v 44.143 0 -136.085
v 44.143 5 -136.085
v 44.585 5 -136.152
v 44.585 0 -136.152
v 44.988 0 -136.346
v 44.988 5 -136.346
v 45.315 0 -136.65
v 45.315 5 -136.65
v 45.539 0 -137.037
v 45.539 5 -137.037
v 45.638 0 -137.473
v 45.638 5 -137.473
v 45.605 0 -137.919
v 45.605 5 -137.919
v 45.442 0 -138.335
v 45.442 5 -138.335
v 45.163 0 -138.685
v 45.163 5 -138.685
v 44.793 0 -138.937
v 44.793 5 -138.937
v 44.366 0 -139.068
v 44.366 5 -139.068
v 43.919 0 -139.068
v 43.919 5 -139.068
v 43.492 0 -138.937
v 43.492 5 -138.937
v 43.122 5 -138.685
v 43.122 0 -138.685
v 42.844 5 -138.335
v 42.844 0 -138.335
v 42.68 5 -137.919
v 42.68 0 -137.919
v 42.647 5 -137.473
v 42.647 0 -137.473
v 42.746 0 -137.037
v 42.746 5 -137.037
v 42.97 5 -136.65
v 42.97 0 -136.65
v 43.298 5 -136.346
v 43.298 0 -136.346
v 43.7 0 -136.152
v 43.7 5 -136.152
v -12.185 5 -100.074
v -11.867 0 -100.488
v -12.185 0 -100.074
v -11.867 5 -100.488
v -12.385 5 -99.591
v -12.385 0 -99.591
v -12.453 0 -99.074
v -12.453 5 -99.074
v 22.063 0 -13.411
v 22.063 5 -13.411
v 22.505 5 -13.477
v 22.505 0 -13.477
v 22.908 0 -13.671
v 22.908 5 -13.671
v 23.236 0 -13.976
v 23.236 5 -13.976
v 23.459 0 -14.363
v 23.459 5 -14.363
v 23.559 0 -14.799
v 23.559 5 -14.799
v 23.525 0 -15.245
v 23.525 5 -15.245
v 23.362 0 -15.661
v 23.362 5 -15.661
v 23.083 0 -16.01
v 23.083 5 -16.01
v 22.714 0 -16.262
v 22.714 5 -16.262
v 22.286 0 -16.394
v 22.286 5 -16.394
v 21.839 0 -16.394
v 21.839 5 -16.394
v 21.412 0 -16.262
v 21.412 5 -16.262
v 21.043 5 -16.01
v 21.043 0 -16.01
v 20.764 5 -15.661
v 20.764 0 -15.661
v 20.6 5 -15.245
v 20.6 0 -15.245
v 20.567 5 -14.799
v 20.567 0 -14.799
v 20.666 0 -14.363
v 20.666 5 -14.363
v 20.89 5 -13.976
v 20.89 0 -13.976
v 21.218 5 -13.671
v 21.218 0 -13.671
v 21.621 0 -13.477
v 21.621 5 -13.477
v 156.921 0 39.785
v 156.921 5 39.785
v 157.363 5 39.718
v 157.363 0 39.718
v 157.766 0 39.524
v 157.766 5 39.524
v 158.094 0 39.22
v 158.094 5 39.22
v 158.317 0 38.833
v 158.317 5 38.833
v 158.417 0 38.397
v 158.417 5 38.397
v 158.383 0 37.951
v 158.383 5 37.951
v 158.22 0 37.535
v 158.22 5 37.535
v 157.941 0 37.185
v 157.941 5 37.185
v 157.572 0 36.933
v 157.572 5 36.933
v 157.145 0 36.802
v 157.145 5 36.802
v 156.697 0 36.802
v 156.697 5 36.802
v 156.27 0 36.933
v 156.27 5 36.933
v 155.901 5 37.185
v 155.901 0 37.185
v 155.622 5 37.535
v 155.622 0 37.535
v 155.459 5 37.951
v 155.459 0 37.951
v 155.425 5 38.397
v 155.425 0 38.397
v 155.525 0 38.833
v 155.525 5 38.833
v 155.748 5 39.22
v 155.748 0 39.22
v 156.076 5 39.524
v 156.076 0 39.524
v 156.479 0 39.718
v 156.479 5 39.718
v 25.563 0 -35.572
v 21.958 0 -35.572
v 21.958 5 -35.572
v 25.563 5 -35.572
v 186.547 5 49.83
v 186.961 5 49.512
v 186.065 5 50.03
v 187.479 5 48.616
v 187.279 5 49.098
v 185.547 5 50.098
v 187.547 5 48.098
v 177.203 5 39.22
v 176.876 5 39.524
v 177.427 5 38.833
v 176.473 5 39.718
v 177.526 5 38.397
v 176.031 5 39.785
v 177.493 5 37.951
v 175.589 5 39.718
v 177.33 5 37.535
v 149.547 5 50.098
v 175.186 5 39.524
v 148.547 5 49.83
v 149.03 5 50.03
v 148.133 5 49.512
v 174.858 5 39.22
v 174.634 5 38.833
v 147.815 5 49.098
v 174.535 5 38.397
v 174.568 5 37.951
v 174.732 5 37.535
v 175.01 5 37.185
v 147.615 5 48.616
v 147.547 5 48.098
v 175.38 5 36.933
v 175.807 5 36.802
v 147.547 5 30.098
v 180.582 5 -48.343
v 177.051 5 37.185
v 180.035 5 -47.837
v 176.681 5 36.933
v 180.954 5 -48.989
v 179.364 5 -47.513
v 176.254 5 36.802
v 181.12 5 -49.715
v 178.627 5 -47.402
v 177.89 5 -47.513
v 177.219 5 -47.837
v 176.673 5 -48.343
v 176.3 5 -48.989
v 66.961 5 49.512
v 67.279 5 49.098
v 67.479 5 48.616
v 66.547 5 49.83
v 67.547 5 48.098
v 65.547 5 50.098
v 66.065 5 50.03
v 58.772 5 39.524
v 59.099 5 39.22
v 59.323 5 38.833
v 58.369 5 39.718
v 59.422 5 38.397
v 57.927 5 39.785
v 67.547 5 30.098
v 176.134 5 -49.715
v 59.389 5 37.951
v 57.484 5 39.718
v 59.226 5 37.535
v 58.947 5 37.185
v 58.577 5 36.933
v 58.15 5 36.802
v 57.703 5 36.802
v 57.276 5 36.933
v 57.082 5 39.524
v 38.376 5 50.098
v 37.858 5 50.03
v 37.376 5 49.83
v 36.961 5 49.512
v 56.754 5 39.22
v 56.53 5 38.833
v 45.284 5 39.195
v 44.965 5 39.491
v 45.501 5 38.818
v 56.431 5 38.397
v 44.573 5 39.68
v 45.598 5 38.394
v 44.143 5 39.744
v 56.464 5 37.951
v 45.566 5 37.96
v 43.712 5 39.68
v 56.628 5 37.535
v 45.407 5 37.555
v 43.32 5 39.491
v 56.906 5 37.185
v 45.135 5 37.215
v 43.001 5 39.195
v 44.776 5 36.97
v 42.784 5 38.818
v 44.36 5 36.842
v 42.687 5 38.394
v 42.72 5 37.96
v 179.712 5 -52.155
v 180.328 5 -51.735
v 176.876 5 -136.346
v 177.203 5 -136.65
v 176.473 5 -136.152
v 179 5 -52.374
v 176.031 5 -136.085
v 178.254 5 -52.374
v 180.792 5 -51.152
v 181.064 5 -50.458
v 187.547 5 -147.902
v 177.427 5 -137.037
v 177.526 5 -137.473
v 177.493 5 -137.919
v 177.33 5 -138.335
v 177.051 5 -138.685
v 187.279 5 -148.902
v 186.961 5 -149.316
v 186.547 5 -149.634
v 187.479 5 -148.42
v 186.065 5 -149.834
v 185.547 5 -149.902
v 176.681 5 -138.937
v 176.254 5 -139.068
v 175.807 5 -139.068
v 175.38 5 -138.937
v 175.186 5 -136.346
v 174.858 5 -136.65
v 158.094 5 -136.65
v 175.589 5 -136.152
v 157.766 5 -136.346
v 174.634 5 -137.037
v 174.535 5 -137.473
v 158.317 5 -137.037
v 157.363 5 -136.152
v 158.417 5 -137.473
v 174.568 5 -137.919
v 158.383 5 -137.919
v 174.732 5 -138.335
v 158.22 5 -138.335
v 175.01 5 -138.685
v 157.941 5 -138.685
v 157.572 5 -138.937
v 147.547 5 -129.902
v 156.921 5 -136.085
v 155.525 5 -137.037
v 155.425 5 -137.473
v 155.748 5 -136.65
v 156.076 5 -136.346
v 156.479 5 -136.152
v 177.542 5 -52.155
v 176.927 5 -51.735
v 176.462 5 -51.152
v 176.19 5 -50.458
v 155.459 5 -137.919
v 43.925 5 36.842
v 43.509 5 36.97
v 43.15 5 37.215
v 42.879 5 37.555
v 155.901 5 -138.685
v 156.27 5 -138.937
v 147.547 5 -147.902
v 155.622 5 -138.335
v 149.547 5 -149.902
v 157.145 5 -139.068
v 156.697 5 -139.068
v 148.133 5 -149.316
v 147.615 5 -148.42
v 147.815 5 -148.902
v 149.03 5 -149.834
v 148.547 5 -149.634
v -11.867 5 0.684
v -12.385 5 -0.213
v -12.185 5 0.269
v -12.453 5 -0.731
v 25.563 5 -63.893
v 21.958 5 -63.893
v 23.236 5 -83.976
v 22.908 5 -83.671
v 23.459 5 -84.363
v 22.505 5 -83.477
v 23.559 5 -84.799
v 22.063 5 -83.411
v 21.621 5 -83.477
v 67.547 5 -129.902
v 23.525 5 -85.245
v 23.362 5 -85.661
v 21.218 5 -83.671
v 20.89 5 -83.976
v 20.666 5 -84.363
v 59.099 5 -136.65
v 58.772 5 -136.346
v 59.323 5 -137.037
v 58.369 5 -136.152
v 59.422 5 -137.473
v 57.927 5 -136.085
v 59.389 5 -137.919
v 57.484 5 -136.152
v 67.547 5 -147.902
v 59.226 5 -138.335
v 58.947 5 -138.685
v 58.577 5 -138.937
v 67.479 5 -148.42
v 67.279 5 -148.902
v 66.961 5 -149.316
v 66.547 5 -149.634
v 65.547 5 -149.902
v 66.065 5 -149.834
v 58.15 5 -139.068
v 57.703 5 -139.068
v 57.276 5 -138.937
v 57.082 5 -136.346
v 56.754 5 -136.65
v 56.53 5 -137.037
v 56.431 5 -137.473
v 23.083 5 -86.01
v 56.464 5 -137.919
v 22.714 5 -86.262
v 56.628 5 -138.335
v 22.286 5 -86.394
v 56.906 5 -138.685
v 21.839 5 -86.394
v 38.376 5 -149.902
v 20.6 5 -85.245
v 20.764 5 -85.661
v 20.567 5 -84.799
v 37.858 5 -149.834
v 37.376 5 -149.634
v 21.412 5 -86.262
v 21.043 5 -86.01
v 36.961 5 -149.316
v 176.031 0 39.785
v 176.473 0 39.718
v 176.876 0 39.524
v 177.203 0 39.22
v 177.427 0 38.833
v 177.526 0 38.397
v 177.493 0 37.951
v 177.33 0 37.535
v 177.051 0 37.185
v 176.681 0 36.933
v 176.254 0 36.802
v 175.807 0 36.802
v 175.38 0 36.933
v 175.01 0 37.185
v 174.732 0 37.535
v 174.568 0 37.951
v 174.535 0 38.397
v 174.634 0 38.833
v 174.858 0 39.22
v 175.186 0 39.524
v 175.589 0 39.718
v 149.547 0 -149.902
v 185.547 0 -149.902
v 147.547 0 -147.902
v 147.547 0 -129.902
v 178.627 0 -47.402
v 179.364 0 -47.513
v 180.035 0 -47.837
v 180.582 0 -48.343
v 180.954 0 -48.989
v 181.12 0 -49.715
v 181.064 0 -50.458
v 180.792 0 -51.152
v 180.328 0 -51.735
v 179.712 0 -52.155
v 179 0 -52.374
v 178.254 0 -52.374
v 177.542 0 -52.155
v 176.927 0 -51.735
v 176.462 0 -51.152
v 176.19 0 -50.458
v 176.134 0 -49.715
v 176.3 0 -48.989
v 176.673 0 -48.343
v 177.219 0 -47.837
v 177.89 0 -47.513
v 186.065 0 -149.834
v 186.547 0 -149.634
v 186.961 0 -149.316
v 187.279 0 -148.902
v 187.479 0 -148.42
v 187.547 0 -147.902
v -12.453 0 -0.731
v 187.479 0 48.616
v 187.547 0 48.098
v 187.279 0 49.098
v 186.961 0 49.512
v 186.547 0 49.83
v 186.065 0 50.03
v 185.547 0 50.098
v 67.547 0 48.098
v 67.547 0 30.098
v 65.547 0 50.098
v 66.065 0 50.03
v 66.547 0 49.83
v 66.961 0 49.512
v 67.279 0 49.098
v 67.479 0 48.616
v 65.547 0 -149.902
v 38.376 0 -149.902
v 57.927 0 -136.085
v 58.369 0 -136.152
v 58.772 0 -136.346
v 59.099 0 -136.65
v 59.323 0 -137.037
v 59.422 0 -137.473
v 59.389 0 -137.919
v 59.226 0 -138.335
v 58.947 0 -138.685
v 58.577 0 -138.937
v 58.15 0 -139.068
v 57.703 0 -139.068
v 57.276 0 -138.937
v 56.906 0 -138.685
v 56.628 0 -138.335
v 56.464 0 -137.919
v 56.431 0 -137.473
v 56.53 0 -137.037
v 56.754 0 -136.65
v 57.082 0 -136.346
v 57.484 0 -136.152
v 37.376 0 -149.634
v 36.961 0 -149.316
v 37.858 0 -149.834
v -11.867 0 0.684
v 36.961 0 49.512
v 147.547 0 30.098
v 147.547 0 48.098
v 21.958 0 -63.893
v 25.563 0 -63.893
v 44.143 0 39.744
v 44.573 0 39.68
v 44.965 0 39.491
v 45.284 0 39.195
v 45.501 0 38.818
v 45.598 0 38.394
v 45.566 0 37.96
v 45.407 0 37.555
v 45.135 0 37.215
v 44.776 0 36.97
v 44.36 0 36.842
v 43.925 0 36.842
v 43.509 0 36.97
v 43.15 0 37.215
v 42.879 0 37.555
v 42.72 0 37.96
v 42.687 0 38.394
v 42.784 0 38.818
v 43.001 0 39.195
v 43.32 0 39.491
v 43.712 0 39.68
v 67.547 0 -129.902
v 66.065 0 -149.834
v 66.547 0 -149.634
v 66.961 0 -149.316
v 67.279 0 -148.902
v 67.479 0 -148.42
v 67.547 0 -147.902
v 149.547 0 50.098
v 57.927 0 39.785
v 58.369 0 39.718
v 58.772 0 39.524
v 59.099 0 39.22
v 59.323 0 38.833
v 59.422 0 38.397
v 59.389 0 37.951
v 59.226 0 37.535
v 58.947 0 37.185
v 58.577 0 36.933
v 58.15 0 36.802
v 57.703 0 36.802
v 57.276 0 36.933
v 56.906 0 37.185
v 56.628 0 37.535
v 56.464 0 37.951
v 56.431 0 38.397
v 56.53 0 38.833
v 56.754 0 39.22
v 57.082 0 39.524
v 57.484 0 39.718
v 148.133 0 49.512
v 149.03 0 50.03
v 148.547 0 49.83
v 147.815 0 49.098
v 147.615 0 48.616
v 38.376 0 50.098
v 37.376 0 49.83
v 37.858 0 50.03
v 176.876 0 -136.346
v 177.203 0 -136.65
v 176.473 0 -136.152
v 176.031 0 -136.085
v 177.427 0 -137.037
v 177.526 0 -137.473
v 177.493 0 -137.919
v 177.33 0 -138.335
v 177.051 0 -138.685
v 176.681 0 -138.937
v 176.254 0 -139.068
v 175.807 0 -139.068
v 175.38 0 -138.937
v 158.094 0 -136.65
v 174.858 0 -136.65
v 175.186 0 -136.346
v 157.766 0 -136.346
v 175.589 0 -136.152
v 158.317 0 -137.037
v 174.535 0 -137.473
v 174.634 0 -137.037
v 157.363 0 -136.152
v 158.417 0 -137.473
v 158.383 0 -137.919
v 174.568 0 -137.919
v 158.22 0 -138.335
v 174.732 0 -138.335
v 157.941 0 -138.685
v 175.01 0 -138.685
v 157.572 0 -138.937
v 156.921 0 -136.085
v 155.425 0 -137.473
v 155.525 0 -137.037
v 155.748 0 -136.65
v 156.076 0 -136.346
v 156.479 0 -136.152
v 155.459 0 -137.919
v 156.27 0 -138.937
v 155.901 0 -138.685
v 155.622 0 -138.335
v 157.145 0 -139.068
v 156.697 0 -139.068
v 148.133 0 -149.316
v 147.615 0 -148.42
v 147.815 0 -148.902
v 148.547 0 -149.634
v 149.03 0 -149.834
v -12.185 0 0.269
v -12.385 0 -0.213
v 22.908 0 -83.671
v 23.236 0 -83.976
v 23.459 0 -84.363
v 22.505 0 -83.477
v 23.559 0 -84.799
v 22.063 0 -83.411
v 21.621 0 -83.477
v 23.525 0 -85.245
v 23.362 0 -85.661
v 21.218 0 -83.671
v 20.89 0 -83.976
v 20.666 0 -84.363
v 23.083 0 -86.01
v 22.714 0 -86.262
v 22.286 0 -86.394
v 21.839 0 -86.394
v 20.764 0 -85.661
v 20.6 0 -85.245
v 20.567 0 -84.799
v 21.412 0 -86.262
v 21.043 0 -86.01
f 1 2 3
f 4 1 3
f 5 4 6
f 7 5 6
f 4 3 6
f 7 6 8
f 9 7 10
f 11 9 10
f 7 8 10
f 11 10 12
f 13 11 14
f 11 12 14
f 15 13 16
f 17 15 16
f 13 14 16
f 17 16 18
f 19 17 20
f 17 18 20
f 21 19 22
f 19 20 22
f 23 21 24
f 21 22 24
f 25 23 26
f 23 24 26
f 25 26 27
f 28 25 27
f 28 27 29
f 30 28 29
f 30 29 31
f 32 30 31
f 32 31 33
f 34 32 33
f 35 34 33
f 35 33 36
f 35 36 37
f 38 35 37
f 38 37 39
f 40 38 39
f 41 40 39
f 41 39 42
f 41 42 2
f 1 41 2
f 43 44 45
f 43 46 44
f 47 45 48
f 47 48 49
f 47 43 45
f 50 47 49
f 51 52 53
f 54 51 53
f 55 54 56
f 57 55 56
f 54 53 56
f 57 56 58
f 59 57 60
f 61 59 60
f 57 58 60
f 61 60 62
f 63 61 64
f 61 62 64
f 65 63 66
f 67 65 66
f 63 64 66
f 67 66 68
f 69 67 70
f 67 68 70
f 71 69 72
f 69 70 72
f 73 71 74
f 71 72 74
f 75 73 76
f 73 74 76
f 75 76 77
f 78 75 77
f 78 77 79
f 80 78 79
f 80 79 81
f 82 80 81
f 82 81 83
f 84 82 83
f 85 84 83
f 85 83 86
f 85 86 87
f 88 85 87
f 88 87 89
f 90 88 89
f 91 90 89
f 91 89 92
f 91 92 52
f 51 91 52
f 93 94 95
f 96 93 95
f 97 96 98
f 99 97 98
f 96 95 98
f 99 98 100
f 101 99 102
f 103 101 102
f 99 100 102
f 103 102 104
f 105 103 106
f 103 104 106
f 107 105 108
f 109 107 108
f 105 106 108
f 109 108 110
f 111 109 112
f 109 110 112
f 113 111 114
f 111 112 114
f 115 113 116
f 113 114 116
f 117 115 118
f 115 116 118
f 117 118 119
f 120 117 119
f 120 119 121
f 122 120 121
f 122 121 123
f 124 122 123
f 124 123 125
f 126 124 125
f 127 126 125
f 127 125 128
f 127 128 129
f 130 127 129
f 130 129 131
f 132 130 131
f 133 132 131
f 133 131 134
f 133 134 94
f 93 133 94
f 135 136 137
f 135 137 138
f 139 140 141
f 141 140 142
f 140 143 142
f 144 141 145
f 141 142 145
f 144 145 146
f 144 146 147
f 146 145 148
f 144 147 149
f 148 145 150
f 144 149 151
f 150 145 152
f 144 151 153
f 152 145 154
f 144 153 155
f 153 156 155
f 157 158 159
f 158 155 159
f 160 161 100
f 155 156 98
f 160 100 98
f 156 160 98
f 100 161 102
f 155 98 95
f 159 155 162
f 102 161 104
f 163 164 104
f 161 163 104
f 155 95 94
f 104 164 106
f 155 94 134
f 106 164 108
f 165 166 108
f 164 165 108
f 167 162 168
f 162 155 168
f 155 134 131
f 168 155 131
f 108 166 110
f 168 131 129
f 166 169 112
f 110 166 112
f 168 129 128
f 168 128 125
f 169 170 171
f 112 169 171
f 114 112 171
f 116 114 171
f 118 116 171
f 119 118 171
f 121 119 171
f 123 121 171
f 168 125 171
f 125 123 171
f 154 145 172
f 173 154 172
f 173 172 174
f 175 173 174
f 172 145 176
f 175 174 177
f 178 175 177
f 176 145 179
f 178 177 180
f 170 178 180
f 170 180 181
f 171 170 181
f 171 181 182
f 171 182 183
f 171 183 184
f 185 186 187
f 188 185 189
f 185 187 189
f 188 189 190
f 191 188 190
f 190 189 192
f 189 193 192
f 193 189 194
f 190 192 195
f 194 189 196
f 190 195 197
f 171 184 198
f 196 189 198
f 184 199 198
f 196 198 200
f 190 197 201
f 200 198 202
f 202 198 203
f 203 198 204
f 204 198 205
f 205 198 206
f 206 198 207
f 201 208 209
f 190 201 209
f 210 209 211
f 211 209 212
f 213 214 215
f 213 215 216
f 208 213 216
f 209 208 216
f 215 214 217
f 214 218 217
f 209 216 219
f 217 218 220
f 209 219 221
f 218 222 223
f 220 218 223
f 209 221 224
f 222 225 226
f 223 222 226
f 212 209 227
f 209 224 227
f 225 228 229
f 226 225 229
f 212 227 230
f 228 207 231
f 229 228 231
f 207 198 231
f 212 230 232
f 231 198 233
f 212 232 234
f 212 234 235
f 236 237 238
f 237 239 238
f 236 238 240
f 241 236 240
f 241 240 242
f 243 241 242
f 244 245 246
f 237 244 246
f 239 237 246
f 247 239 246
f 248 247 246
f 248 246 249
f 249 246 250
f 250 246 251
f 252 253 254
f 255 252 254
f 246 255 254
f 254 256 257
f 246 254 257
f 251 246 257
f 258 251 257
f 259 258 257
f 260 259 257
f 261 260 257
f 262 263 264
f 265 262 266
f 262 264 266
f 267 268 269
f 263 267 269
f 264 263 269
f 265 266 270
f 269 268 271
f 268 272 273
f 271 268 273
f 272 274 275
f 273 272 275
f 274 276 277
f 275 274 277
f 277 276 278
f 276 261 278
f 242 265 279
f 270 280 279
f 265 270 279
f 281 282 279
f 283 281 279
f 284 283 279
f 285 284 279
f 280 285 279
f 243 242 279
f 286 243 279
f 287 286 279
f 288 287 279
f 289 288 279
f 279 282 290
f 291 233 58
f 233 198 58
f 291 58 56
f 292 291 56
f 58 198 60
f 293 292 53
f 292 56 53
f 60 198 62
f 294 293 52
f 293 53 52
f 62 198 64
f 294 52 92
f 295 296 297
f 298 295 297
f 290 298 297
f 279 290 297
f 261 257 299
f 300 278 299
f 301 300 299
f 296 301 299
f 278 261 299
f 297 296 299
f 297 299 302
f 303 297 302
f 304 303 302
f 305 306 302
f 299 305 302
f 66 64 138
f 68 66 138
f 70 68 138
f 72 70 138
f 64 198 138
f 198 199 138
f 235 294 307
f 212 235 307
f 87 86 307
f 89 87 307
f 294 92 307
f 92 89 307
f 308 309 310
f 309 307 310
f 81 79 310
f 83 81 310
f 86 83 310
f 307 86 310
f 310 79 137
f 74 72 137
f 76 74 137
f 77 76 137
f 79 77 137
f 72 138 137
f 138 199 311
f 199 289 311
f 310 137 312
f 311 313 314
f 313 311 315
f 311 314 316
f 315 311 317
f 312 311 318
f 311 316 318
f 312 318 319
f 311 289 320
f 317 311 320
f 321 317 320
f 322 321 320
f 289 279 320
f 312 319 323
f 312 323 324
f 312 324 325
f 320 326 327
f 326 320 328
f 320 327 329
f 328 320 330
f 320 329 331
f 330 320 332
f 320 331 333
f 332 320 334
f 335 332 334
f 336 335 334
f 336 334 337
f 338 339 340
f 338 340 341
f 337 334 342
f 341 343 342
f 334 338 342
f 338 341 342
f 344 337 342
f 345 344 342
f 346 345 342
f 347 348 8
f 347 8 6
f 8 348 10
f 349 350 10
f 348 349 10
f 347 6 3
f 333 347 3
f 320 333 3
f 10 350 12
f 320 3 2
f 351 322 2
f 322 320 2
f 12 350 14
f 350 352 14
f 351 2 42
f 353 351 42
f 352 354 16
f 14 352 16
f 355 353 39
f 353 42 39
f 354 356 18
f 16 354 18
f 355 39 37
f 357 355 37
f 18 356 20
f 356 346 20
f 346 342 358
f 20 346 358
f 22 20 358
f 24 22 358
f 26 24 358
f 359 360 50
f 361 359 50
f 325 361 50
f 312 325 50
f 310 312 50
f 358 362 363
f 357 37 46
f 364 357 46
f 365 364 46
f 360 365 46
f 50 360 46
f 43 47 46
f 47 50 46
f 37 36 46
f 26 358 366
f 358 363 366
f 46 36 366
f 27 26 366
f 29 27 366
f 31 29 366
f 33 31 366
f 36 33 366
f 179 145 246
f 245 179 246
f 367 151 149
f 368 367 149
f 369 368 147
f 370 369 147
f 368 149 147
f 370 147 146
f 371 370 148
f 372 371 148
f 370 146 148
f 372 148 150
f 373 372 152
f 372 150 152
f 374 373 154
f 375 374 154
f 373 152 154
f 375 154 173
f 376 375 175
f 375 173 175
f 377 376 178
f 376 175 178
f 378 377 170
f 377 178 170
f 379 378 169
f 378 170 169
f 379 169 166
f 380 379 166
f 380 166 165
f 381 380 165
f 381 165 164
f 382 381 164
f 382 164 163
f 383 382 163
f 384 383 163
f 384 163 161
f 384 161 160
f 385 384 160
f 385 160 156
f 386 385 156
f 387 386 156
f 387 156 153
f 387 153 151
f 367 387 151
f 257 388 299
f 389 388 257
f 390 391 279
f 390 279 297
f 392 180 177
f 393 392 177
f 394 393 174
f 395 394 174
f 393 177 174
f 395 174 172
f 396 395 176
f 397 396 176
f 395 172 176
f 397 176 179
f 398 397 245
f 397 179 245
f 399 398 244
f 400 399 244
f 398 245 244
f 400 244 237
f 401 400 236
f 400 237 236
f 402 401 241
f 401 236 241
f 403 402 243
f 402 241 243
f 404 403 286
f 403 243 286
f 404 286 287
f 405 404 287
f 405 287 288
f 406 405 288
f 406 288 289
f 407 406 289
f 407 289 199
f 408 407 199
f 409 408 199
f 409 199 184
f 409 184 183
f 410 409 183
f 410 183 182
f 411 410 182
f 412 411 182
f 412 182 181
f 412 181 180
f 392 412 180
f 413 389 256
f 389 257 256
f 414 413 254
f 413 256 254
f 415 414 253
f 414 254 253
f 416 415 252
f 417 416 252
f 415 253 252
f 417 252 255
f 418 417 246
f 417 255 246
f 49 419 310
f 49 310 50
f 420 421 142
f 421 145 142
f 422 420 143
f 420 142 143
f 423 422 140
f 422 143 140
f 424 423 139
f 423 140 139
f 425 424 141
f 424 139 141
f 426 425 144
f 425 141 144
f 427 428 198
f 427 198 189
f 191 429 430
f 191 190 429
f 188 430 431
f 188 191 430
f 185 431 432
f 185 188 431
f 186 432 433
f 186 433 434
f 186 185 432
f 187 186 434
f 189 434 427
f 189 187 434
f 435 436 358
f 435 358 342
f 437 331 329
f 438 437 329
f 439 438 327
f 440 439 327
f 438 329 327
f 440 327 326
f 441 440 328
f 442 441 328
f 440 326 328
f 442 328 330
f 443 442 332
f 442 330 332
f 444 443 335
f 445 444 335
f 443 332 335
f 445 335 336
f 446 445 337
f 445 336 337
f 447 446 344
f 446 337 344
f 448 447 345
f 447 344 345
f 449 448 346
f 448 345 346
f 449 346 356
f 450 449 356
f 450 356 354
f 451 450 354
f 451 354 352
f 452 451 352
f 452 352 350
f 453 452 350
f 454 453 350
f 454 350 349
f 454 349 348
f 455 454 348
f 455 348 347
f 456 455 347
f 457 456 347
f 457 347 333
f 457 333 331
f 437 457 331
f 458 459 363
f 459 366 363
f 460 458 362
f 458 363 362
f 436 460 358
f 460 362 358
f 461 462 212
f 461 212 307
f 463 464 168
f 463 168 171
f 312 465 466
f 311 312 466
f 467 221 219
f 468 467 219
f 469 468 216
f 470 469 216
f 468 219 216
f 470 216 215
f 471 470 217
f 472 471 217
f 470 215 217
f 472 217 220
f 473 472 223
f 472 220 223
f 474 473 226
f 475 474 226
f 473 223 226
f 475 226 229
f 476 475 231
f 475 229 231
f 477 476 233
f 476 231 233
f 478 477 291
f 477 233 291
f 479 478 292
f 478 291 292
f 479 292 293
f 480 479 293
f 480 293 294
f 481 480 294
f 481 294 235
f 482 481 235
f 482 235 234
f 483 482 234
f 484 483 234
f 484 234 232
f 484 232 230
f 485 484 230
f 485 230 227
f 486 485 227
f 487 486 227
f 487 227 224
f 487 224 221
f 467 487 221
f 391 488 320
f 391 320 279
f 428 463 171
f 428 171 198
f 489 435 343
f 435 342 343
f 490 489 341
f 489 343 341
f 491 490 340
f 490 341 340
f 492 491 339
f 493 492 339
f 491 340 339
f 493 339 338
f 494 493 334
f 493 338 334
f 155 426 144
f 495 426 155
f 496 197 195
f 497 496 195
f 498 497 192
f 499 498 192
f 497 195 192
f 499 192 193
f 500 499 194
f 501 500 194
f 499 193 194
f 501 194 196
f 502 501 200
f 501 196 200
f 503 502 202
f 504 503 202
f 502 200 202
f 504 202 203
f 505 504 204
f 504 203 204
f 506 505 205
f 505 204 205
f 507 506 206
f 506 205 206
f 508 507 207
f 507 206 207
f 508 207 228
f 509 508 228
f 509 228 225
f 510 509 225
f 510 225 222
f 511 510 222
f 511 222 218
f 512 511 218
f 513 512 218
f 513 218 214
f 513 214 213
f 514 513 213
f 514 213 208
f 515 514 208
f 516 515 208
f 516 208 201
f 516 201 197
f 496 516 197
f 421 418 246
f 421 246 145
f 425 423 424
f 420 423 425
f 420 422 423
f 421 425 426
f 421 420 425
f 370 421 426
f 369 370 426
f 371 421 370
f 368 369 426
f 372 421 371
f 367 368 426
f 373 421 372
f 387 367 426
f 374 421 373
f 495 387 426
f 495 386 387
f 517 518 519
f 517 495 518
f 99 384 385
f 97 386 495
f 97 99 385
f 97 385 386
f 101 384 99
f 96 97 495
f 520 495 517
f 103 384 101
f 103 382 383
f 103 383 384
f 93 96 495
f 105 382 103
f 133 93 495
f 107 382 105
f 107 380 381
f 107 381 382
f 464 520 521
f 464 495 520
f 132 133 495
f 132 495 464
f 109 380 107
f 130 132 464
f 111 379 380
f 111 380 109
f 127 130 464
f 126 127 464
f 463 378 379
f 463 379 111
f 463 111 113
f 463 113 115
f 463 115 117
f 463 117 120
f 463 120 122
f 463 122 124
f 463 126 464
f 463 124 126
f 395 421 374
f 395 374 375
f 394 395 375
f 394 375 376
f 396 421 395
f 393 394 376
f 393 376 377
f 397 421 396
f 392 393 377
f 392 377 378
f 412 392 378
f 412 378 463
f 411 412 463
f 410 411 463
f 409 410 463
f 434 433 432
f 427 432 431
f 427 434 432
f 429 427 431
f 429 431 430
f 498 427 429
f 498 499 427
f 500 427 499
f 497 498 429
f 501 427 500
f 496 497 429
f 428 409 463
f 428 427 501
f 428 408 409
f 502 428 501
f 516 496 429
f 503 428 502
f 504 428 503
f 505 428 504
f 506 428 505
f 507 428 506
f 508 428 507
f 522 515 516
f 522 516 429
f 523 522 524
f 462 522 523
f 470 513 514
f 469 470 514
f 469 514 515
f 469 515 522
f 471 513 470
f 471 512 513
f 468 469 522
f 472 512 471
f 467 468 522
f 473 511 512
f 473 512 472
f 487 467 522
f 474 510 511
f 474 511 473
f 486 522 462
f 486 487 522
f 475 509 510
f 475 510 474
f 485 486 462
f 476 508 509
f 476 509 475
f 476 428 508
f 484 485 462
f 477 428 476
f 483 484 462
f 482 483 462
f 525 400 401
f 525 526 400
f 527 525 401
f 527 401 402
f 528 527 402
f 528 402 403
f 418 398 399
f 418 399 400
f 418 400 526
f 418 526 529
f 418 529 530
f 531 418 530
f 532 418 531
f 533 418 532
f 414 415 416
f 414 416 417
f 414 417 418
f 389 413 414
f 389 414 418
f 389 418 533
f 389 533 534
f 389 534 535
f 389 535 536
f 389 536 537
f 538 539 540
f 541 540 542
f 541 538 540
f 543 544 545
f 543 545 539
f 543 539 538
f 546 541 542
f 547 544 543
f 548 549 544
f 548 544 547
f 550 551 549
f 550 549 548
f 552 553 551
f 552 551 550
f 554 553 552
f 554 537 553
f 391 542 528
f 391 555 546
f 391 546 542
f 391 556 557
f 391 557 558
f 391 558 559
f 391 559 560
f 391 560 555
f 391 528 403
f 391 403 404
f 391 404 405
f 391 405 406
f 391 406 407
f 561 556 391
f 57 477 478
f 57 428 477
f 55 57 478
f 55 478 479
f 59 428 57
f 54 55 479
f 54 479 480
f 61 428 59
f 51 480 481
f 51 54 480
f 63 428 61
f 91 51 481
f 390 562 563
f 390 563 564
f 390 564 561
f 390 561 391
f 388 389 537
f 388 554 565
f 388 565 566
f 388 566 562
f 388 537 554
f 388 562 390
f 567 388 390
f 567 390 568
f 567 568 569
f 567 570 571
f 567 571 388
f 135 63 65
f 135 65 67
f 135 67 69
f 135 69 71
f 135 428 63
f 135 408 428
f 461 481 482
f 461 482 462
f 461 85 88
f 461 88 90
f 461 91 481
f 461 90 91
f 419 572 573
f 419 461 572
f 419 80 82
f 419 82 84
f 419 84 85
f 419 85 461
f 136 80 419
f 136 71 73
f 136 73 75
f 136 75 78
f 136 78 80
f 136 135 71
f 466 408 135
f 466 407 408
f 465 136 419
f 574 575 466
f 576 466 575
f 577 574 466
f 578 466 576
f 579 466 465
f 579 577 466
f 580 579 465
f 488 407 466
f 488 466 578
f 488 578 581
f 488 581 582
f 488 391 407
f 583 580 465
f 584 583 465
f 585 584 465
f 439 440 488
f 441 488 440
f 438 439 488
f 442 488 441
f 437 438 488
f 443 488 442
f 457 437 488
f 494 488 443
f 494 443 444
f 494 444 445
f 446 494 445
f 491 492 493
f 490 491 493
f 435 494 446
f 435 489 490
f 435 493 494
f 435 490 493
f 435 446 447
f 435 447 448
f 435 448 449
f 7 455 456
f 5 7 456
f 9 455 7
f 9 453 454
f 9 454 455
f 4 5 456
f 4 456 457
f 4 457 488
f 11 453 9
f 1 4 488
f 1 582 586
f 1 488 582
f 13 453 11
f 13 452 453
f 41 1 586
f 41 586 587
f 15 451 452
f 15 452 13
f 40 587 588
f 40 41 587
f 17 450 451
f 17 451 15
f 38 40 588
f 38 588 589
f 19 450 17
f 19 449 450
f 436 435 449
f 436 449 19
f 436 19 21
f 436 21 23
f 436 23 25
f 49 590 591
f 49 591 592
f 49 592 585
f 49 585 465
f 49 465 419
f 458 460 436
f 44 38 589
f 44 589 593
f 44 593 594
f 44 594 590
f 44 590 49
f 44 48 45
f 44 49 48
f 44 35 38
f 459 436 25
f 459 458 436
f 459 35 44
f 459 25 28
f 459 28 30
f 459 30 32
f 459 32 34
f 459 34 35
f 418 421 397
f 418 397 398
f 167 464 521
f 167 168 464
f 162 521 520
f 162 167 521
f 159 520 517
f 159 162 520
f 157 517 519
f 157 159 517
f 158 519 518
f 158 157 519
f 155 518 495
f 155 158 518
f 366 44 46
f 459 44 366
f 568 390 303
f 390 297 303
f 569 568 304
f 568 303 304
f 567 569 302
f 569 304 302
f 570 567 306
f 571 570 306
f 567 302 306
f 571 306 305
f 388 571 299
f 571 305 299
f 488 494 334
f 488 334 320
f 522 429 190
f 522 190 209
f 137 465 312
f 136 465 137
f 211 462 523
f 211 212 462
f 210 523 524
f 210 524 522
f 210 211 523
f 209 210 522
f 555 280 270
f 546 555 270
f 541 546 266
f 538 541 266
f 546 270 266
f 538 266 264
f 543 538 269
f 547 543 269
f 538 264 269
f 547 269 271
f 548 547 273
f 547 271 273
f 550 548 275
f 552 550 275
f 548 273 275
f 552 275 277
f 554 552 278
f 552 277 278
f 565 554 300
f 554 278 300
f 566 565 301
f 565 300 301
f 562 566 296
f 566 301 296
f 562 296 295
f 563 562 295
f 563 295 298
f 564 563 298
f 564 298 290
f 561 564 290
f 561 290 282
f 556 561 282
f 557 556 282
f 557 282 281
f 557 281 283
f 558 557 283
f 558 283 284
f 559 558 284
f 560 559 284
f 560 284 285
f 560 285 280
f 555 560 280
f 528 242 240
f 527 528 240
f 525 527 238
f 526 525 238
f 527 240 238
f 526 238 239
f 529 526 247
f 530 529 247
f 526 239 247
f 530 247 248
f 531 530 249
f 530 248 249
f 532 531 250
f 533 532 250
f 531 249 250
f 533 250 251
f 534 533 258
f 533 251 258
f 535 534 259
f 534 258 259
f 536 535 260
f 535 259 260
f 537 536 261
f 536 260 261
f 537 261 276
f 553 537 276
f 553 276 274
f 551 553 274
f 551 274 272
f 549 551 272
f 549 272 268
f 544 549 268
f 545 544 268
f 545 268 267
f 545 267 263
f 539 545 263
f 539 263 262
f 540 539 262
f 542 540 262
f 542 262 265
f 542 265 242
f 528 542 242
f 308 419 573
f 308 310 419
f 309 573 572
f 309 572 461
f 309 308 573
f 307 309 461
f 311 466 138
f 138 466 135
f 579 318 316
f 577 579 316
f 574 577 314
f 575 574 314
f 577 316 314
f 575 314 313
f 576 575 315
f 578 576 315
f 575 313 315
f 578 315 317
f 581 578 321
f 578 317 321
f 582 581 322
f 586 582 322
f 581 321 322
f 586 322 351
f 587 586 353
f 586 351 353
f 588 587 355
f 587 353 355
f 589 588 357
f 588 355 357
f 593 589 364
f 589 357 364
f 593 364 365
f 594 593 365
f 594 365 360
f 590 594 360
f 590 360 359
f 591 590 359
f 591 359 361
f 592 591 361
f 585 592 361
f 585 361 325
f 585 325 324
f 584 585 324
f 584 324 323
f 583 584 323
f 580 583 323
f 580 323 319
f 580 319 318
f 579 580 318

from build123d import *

# Parameters (mm, degrees)
BOSS_EXTRUDE1_DEPTH = 5
SKETCH5_R           = 2.5
CUT_EXTRUDE3_DEPTH  = 10
FILLET2_R           = 2
SKETCH6_R           = 1.5
CUT_EXTRUDE5_DEPTH  = 10
SKETCH7_W           = 3.604584819
SKETCH7_H           = 28.321717567
CUT_EXTRUDE6_DEPTH  = 10
SKETCH8_R           = 1.5
SKETCH8_R_2         = 1.459602963
CUT_EXTRUDE7_DEPTH  = 10


with BuildPart() as part:
    # Sketch1 → Boss-Extrude1 (new body)
    with BuildSketch(Plane(origin=(0, 0, 0), x_dir=(1, 0, 0), z_dir=(0, 1, 0))):
        Polygon((-12.452830189, 99.902137597), (37.547169811, 149.902137597), (67.547169811, 149.902137597), (67.547169811, 129.902137597), (147.547169811, 129.902137597), (147.547169811, 149.902137597), (187.547169811, 149.902137597), (187.547169811, -50.097862403), (147.547169811, -50.097862403), (147.547169811, -30.097862403), (67.547169811, -30.097862403), (67.547169811, -50.097862403), (37.547169811, -50.097862403), (-12.452830189, -0.097862403), align=None)
    extrude(amount=BOSS_EXTRUDE1_DEPTH)

    # Sketch5 → Cut-Extrude3 (cut)
    with BuildSketch(Plane(origin=(0, 5, 0), x_dir=(1, 0, 0), z_dir=(0, 1, 0))):
        with Locations((178.627103709, 49.902137597)):
            Circle(SKETCH5_R)
    extrude(amount=-CUT_EXTRUDE3_DEPTH, mode=Mode.SUBTRACT)

    # Fillet2
    fillet2_edges = [part.edges().sort_by_distance(p)[0] for p in [
        (147.547169811, 2.5, -149.902137597),
        (67.547169811, 2.5, -149.902137597),
        (37.547169811, 2.5, -149.902137597),
        (-12.452830189, 2.5, -99.902137597),
        (-12.452830189, 2.5, 0.097862403),
        (37.547169811, 2.5, 50.097862403),
        (67.547169811, 2.5, 50.097862403),
        (147.547169811, 2.5, 50.097862403),
        (187.547169811, 2.5, 50.097862403),
        (187.547169811, 2.5, -149.902137597),
    ]]
    fillet(fillet2_edges, radius=FILLET2_R)

    # Sketch6 → Cut-Extrude5 (cut)
    with BuildSketch(Plane(origin=(0, 5, 0), x_dir=(1, 0, 0), z_dir=(0, 1, 0))):
        with Locations((22.062785461, 14.910780602)):
            Circle(SKETCH6_R)
        with Locations((22.062785461, 84.910780602)):
            Circle(SKETCH6_R)
    extrude(amount=-CUT_EXTRUDE5_DEPTH, mode=Mode.SUBTRACT)

    # Sketch7 → Cut-Extrude6 (cut)
    with BuildSketch(Plane.XZ):
        with Locations((23.760493051, -49.732417236)):
            Rectangle(SKETCH7_W, SKETCH7_H)
    extrude(amount=-CUT_EXTRUDE6_DEPTH, mode=Mode.SUBTRACT)

    # Sketch8 → Cut-Extrude7 (cut)
    with BuildSketch(Plane(origin=(0, 5, 0), x_dir=(1, 0, 0), z_dir=(0, 1, 0))):
        with Locations((44.14258974, 137.585115599)):
            Circle(SKETCH8_R)
        with Locations((57.926617395, 137.585115599)):
            Circle(SKETCH8_R)
        with Locations((44.14258974, -38.284805306)):
            Circle(SKETCH8_R_2)
        with Locations((57.926617395, -38.284805306)):
            Circle(SKETCH8_R)
        with Locations((156.920997826, -38.284805306)):
            Circle(SKETCH8_R)
        with Locations((176.030672529, -38.284805306)):
            Circle(SKETCH8_R)
        with Locations((156.920997826, 137.585115599)):
            Circle(SKETCH8_R)
        with Locations((176.030672529, 137.585115599)):
            Circle(SKETCH8_R)
    extrude(amount=-CUT_EXTRUDE7_DEPTH, mode=Mode.SUBTRACT)


solid = part.part
